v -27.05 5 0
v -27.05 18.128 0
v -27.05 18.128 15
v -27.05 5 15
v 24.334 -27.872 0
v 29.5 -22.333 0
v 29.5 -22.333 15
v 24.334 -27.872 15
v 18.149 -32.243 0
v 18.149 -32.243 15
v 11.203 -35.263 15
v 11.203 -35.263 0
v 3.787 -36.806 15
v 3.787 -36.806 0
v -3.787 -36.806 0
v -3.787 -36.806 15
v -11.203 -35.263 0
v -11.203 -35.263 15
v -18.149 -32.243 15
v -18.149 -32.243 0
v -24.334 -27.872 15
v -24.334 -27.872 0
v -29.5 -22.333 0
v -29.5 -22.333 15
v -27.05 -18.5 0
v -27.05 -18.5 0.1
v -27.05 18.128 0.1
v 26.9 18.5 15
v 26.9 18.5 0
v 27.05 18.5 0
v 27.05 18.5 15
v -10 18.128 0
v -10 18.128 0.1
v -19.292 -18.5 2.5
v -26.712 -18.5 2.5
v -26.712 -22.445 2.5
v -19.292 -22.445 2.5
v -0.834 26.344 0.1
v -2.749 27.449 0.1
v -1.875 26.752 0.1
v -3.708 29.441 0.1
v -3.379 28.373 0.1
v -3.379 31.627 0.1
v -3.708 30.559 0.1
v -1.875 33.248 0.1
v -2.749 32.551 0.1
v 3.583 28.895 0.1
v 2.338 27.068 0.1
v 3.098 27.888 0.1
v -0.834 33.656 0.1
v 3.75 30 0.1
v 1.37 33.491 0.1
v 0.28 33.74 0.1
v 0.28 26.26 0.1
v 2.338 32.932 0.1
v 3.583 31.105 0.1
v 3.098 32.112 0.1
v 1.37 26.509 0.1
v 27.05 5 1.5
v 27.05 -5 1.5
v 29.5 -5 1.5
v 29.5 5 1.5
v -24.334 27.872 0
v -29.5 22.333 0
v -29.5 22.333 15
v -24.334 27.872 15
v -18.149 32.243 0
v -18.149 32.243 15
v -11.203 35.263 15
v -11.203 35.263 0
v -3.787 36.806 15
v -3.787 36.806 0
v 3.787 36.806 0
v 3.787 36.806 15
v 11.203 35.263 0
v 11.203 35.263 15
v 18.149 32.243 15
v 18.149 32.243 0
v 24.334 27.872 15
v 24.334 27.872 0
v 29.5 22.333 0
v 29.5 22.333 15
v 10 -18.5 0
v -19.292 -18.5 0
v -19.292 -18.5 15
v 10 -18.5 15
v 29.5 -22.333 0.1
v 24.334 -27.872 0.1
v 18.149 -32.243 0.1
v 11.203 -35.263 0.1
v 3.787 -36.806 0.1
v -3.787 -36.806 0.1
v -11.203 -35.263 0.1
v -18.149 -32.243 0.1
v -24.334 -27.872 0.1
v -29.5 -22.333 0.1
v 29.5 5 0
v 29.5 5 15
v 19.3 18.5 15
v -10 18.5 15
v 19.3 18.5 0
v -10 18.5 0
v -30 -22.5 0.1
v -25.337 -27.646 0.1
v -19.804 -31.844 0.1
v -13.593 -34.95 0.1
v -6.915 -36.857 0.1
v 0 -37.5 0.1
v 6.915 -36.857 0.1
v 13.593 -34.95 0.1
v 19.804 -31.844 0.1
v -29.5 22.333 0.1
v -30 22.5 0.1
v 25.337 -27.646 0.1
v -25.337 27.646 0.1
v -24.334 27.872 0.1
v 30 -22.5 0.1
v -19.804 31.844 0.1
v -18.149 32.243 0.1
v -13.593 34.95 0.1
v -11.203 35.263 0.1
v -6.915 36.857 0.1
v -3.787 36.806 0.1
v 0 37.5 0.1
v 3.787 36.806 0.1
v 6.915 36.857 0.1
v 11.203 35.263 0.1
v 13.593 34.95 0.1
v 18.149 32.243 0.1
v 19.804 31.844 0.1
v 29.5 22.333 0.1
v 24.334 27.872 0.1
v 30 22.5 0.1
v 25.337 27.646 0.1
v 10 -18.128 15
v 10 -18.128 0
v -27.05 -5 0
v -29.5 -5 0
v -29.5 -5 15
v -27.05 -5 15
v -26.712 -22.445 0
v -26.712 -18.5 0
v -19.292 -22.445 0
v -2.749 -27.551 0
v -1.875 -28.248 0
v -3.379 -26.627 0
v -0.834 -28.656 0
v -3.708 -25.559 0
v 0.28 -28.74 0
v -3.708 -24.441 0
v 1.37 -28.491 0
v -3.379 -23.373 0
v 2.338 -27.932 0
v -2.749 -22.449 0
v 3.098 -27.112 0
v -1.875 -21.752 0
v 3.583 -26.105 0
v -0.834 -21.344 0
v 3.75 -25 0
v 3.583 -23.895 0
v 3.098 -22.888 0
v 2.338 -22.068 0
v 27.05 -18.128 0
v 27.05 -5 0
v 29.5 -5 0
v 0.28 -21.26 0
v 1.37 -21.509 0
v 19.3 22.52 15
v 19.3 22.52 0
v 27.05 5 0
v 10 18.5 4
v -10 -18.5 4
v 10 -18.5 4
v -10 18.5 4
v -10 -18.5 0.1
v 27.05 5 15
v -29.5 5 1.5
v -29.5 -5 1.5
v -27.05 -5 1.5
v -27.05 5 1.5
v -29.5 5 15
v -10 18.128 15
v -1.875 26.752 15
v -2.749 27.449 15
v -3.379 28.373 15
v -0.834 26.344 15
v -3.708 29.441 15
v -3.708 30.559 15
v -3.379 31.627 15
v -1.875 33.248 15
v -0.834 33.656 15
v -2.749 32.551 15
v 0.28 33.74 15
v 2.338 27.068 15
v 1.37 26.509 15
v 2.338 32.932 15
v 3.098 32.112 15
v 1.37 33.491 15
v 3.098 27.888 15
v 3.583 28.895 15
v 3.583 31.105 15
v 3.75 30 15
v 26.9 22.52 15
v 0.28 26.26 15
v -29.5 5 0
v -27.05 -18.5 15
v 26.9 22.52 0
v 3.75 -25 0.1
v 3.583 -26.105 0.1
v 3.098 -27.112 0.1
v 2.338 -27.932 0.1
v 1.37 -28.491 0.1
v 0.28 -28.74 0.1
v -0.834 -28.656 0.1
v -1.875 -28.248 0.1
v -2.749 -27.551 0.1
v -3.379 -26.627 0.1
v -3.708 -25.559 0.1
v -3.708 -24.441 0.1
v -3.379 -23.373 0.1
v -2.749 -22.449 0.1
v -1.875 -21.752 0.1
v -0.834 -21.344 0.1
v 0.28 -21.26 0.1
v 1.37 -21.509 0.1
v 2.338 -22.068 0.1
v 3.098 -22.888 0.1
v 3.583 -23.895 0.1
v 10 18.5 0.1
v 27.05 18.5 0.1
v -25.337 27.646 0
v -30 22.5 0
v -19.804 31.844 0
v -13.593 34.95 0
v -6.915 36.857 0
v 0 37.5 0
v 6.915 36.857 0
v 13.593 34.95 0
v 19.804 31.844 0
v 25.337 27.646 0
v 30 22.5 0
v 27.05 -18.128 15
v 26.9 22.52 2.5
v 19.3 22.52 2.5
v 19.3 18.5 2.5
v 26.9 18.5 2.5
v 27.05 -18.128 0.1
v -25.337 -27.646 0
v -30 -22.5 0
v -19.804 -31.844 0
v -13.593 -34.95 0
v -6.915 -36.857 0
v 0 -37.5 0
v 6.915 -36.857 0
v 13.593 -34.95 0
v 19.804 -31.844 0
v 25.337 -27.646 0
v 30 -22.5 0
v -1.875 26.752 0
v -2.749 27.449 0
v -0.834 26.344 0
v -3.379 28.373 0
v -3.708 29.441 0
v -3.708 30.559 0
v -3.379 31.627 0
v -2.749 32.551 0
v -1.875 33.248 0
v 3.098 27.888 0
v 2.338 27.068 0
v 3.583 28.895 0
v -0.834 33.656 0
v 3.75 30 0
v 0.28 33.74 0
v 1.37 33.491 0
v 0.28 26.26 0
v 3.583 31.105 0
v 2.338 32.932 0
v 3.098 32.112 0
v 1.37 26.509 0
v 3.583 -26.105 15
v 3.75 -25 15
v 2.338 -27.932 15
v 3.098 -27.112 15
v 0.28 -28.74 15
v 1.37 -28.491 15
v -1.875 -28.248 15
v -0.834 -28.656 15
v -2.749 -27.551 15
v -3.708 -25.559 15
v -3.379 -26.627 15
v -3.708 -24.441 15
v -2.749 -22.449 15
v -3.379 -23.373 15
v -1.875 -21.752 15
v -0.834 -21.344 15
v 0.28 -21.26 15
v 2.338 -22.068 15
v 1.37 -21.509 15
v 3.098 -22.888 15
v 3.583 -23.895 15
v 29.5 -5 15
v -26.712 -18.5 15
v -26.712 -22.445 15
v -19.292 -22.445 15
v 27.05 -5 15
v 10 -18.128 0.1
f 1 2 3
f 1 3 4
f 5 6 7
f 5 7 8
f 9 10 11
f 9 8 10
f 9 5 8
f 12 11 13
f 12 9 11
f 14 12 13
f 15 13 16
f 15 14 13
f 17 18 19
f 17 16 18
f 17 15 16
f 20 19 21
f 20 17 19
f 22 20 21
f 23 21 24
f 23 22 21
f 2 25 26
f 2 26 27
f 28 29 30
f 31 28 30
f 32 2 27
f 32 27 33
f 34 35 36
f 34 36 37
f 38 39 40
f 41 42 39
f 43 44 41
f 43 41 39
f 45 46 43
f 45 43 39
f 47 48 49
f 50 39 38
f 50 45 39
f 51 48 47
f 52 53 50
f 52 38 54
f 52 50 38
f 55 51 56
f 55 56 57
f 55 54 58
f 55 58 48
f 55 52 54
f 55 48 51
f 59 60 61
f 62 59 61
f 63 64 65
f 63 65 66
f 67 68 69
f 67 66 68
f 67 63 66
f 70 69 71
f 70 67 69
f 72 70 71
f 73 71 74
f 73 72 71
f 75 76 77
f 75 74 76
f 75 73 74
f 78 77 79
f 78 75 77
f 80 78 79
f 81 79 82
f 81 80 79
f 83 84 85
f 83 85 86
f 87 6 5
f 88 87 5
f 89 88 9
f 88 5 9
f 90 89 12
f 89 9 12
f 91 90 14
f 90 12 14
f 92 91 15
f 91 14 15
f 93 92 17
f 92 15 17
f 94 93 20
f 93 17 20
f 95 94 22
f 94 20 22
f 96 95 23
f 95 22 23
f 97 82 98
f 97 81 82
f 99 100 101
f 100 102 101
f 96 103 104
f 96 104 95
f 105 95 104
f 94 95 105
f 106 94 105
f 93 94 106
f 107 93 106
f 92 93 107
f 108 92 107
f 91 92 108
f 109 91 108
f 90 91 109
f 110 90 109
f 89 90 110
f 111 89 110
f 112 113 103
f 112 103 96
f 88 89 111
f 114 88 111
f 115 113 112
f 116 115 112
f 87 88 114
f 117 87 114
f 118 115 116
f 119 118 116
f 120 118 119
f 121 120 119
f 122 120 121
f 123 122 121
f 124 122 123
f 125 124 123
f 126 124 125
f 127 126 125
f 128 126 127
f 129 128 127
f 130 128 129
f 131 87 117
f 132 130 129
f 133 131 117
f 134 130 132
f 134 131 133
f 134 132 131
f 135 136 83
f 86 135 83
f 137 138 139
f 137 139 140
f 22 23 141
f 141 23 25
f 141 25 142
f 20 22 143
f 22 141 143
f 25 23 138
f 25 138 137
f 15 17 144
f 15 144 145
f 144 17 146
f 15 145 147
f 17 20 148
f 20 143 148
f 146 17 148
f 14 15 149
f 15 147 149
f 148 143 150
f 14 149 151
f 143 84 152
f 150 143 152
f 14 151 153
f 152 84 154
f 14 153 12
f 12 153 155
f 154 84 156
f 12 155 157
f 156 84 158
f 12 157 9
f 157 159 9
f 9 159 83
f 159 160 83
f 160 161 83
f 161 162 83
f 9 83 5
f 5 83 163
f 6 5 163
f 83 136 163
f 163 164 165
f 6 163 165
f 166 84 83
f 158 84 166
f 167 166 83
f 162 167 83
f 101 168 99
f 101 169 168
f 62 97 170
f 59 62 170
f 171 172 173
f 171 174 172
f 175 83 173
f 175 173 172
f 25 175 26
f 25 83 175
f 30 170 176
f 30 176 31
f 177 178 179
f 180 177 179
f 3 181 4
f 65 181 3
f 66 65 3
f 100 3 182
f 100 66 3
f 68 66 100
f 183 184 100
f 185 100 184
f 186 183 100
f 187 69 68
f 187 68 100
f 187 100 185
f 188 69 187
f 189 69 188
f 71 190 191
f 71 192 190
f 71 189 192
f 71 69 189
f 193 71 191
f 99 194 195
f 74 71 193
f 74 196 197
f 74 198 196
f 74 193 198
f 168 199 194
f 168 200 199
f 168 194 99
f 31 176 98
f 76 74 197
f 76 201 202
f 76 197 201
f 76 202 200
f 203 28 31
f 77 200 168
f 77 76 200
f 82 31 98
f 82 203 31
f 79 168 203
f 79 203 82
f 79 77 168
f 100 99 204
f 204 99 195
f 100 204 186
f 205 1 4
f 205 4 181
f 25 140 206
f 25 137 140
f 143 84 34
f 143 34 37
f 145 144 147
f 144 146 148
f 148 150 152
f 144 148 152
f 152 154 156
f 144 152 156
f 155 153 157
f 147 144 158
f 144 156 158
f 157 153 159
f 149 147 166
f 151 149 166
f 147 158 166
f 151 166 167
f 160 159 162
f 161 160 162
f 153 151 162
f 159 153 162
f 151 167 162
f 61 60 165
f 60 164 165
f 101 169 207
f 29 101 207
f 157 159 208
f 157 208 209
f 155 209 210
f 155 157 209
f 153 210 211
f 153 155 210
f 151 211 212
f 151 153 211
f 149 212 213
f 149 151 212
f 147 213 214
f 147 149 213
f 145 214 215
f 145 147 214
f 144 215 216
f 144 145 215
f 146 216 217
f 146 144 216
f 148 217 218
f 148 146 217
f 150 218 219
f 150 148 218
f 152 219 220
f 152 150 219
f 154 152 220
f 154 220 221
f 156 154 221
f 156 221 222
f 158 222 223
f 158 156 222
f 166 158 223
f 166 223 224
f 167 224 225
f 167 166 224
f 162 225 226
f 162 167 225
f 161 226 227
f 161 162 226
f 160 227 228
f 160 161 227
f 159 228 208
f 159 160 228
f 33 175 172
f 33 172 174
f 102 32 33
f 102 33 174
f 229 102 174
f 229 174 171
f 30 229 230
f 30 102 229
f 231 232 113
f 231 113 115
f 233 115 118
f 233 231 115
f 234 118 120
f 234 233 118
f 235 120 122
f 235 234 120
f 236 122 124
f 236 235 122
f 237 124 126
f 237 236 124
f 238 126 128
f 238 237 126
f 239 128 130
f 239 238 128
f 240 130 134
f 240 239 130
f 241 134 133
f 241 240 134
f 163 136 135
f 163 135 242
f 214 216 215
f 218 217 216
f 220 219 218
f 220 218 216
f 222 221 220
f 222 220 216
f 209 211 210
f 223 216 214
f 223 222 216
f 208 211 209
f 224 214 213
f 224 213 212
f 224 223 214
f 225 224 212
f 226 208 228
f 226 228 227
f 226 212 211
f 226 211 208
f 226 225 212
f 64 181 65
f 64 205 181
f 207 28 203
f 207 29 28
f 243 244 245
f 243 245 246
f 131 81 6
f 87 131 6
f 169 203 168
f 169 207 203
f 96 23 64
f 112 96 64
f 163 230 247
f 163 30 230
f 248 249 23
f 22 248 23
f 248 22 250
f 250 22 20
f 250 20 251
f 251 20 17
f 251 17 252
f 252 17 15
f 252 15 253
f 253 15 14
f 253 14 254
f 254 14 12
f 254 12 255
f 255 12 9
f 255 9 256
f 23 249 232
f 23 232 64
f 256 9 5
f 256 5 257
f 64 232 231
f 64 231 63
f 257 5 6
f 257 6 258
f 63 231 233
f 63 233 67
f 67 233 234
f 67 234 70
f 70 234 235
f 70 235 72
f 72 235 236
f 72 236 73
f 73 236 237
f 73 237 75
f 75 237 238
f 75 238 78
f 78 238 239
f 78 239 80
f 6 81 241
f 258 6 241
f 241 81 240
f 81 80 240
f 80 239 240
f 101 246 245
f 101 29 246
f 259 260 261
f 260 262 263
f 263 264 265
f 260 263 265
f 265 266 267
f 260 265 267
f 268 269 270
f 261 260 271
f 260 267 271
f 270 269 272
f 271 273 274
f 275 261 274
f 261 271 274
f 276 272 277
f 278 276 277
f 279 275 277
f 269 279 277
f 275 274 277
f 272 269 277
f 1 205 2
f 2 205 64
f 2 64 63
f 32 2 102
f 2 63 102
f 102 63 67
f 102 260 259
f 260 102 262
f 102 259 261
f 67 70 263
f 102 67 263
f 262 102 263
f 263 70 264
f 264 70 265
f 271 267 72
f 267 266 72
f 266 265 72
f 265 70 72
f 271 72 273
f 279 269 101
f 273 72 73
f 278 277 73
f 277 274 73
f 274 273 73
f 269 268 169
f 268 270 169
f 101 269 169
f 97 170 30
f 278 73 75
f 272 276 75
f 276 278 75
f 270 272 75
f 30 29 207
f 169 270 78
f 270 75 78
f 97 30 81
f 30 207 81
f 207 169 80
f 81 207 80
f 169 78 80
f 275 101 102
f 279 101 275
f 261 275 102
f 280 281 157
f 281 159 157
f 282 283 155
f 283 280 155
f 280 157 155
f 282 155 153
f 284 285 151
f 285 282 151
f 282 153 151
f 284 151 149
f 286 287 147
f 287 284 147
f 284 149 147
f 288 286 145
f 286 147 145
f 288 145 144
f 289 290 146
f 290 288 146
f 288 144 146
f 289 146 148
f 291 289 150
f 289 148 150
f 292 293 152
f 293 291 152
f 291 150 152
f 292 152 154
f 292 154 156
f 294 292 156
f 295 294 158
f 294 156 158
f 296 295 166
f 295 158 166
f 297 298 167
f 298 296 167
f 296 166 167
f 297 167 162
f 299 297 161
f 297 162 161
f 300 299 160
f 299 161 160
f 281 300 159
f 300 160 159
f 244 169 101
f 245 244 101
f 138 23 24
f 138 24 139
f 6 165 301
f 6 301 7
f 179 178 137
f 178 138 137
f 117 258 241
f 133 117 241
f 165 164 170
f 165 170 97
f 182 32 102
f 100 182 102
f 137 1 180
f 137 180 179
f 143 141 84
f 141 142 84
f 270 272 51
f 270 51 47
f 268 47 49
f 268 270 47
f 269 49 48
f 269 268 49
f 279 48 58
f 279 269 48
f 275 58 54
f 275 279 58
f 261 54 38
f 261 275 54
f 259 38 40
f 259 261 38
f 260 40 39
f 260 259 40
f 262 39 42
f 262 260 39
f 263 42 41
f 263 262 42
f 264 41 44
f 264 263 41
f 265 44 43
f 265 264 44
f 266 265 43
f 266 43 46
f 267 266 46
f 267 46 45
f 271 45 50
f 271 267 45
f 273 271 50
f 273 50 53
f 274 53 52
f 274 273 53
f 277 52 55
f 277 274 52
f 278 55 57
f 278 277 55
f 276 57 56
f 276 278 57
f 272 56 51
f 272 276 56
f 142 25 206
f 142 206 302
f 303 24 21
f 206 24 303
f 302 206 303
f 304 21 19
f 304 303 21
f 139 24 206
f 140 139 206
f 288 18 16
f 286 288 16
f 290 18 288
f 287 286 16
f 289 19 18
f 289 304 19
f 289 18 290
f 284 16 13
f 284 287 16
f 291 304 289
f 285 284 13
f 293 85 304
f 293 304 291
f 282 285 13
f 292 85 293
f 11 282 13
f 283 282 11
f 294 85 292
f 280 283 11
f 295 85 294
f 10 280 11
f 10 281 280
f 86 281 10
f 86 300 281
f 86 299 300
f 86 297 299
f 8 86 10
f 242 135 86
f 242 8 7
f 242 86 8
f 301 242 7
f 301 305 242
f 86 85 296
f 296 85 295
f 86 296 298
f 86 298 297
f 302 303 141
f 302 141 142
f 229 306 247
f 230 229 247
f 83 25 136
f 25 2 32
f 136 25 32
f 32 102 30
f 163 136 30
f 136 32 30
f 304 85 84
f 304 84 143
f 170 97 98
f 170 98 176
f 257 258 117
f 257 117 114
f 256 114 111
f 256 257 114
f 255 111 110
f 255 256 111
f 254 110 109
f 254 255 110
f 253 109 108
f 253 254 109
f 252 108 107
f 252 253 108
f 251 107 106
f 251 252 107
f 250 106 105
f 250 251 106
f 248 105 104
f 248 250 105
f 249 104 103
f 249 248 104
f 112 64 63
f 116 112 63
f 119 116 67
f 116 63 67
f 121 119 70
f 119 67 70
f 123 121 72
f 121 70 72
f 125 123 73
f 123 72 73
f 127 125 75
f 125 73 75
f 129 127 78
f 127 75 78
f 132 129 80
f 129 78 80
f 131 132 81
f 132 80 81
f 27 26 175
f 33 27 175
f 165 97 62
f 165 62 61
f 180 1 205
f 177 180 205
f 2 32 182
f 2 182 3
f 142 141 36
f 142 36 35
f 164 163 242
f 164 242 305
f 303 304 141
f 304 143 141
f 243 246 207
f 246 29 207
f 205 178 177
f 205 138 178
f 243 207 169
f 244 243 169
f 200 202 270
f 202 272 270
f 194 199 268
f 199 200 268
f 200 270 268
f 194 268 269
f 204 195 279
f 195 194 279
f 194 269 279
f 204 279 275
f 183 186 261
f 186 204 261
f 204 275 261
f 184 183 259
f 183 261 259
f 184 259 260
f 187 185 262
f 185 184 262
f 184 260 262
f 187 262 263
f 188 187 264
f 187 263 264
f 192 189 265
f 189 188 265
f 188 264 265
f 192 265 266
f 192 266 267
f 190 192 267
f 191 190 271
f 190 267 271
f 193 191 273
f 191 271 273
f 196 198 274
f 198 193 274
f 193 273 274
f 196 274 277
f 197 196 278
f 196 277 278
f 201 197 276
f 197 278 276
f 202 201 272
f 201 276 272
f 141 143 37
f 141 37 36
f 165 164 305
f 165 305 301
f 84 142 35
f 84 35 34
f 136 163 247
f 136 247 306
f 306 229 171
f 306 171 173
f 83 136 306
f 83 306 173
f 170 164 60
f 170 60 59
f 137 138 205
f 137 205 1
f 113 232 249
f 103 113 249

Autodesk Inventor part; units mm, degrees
ref_plane "YZ Plane" through (0, 0, 0) normal (1, 0, 0) x (0, 1, 0)
ref_plane "XZ Plane" through (0, 0, 0) normal (0, 1, 0) x (-1, 0, 0)
ref_plane "XY Plane" through (0, 0, 0) normal (0, 0, 1) x (1, 0, 0)
ref_plane "Work Plane1" through (0, 40.5, -6.5875) normal (0, 1, 0) x (1, 0, 0)
ref_plane "Work Plane2" through (0, 0, 0) normal (0, 0, 1) x (1, 0, 0)
sketch "KEEPOUT_BOT_0.1MM_S" plane through (0, 0, 0) normal (0, 0, 1) x (1, 0, 0)
  circle A0 centre (0, -25) radius 1.75 projected
  circle A1 centre (-14, -14) radius 1.75 projected
  circle A2 centre (22, -14) radius 1.75 projected
  circle A3 centre (14, 14) radius 1.75 projected
  circle A4 centre (-22, 14) radius 1.75 projected
  circle A5 centre (0, 30) radius 1.75 projected
  line L0 (-30, 22.5) -> (-30, -22.5) projected
  arc A6 (-30, -22.5) -> (30, -22.5) centre (0, 0) ccw projected
  line L1 (30, -22.5) -> (30, 22.5) projected
  arc A7 (30, 22.5) -> (-30, 22.5) centre (0, 0) ccw projected
  circle A8 centre (0, -25) radius 3.75 projected
  circle A9 centre (0, 30) radius 3.75 projected
  circle A10 centre (-22, 14) radius 1.75 projected
  circle A11 centre (-14, -14) radius 1.75 projected
  line L2 (-18.5, 11.6278) -> (-26.55, 11.6278) projected
  arc A12 (-16.5, 9.6278) -> (-18.5, 11.6278) centre (-18.5, 9.6278) ccw projected
  line L3 (-16.5, -17) -> (-16.5, 9.6278) projected
  arc A13 (-16.7679, -18) -> (-16.5, -17) centre (-18.5, -17) ccw projected
  line L4 (-16.7679, -18) -> (-12.5, -18) projected
  arc A14 (-12.5, -18) -> (-10.5, -16) centre (-12.5, -16) ccw projected
  line L5 (-10.5, 15.6278) -> (-10.5, -16) projected
  arc A15 (-10.5, 15.6278) -> (-12.5, 17.6278) centre (-12.5, 15.6278) ccw projected
  line L6 (-24.55, 17.6278) -> (-12.5, 17.6278) projected
  arc A16 (-24.55, 17.6278) -> (-26.55, 15.6278) centre (-24.55, 15.6278) ccw projected
  line L7 (-26.55, 11.6278) -> (-26.55, 15.6278) projected
  circle A17 centre (22, -14) radius 1.75 projected
  circle A18 centre (14, 14) radius 1.75 projected
  line L8 (18.5, -11.6278) -> (26.55, -11.6278) projected
  arc A19 (16.5, -9.6278) -> (18.5, -11.6278) centre (18.5, -9.6278) ccw projected
  line L9 (16.5, 17) -> (16.5, -9.6278) projected
  arc A20 (16.7679, 18) -> (16.5, 17) centre (18.5, 17) ccw projected
  line L10 (16.7679, 18) -> (12.5, 18) projected
  arc A21 (12.5, 18) -> (10.5, 16) centre (12.5, 16) ccw projected
  line L11 (10.5, -15.6278) -> (10.5, 16) projected
  arc A22 (10.5, -15.6278) -> (12.5, -17.6278) centre (12.5, -15.6278) ccw projected
  line L12 (24.55, -17.6278) -> (12.5, -17.6278) projected
  arc A23 (24.55, -17.6278) -> (26.55, -15.6278) centre (24.55, -15.6278) ccw projected
  line L13 (26.55, -11.6278) -> (26.55, -15.6278) projected
  line L14 (23.1, 22.02) -> (24.3, 22.02) projected
  line L15 (26.55, -15.6278) -> (26.55, 4.9922) projected
  line L16 (-23.1, -22.02) -> (-24.3, -22.02) projected
  line L17 (-26.55, -11.0422) -> (-26.55, -17) projected
  line L18 (26.7562, -18.1278) -> (10, -18.1278)
  line L19 (10, -18.1278) -> (10, 18.5)
  line L20 (10, 18.5) -> (27.05, 18.5)
  line L21 (27.05, 18.5) -> (27.05, -18.1278)
  line L22 (27.05, -18.1278) -> (26.7562, -18.1278)
  line L23 (-10, -18.5) -> (-27.05, -18.5)
  line L24 (-27.05, -18.5) -> (-27.05, 18.1278)
  line L25 (-27.05, 18.1278) -> (-10, 18.1278)
  line L26 (-10, 18.1278) -> (-10, -18.5)
  arc A24 (-29.5, -22.3327) -> (29.5, -22.3327) centre (0, 0) ccw
  line L27 (-29.5, -22.3327) -> (-29.5, 22.3327)
  arc A25 (29.5, 22.3327) -> (-29.5, 22.3327) centre (0, 0) ccw
  line L28 (29.5, 22.3327) -> (29.5, -22.3327)
  point P0 (0, 0)
  dimension "d0" = 0.5
  dimension "d1" = 0.5
  dimension "d2" = 0.5
  dimension "d3" = 0.5
  dimension "d4" = 0.5
  dimension "d5" = 0.5
  dimension "d6" = 0.5
  dimension "d7" = 0.5
  dimension "d12" = 0.5
extrude "KEEPUT_BOT_0.1MM" add sketch "KEEPOUT_BOT_0.1MM_S" along normal blind 0.1 contours A0 | A1 | A2 | A3 | A4 | A5 | A7 L1 A6 L0 | A8 | A9 | L2 L7 A16 L6 A15 L5 A14 L4 A13 L3 A12 | L8 L13 A23 L12 A22 L11 A21 L10 A20 L9 A19 | L18 L19 L20 L21 L22 | L23 L24 L25 L26
ref_plane "Work Plane3" through (0, 0, 0) normal (0, 0, 1) x (1, 0, 0)
sketch "KEEPOUT_BOT_1.5MM_S" plane through (0, 0, 0) normal (0, 0, 1) x (1, 0, 0)
  line L0 (10, -18.1278) -> (27.05, -18.1278)
  line L1 (27.05, -18.1278) -> (27.05, 18.5)
  line L2 (27.05, 18.5) -> (10, 18.5)
  line L3 (10, 18.5) -> (10, -18.1278)
  line L4 (21.9, 22.02) -> (23.1, 22.02)
  line L5 (19.8, 18.35) -> (19.8, 20.35)
  line L6 (27.05, 18.5) -> (19.3, 18.5)
  line L7 (19.3, 18.5) -> (19.3, 22.52)
  line L8 (19.3, 22.52) -> (27.05, 22.52)
  line L9 (27.05, 22.52) -> (27.05, 18.5)
  line L10 (27.4, -5) -> (30.4, -5)
  line L11 (27.4, 5) -> (30.4, 5)
  line L12 (-29.5, -22.3327) -> (-29.5, 22.3327)
  arc A0 (29.5, 22.3327) -> (-29.5, 22.3327) centre (0, 0) ccw
  line L13 (29.5, 22.3327) -> (29.5, -22.3327)
  arc A1 (-29.5, -22.3327) -> (29.5, -22.3327) centre (0, 0) ccw
  line L14 (-30, 22.5) -> (-30, -22.5)
  arc A2 (-30, -22.5) -> (30, -22.5) centre (0, 0) ccw
  line L15 (30, -22.5) -> (30, 22.5)
  arc A3 (30, 22.5) -> (-30, 22.5) centre (0, 0) ccw
  line L16 (29.5, 22.3327) -> (29.5, -22.3327)
  line L17 (27.05, 18.5) -> (27.05, -18.1278)
  line L18 (29.5, 5) -> (27.05, 5)
  line L19 (27.05, 5) -> (27.05, -5)
  line L20 (27.05, -5) -> (29.5, -5)
  line L21 (29.5, -5) -> (29.5, 5)
  line L22 (-27.05, -18.5) -> (-10, -18.5)
  line L23 (-10, -18.5) -> (-10, 18.1278)
  line L24 (-10, 18.1278) -> (-27.05, 18.1278)
  line L25 (-27.05, 18.1278) -> (-27.05, -18.5)
  line L26 (-27.4, 5) -> (-30.4, 5)
  line L27 (-27.4, -5) -> (-30.4, -5)
  line L28 (-29.5, 22.3327) -> (-29.5, -22.3327)
  line L29 (-29.5, -5) -> (-27.05, -5)
  line L30 (-27.05, -5) -> (-27.05, 5)
  line L31 (-27.05, 5) -> (-29.5, 5)
  line L32 (-29.5, 5) -> (-29.5, -5)
  line L33 (-23.1, -22.02) -> (-24.3, -22.02)
  line L34 (-19.8, -10.37) -> (-19.8, -19.37)
  line L35 (-10, -18.5) -> (-27.05, -18.5)
  line L36 (-27.05, -18.5) -> (-19.8, -18.5)
  line L37 (-19.8, -18.5) -> (-19.8, -22.02)
  line L38 (-19.8, -22.02) -> (-27.05, -22.02)
  line L39 (-27.05, -22.02) -> (-27.05, -18.5)
  point P0 (0, 0)
extrude "KEEPOUT_BOT_1.5MM" add sketch "KEEPOUT_BOT_1.5MM_S" along normal blind 1.5 separate body contours L1 L18 L11 L13 L10 L20 | L12 L26 L31 L25 L29 L27
ref_plane "Work Plane4" through (0, 0, 0) normal (0, 0, 1) x (1, 0, 0)
sketch "KEEPOUT_BOT_2.5MM_S" plane through (0, 0, 0) normal (0, 0, 1) x (1, 0, 0)
  line L0 (23.1, 22.02) -> (24.3, 22.02) projected
  line L1 (19.8, 10.37) -> (19.8, 19.37) projected
  line L2 (26.4, 10.37) -> (26.4, 19.37) projected
  line L3 (27.05, 18.5) -> (10, 18.5) projected
  line L4 (19.3, 18.5) -> (26.9, 18.5)
  line L5 (26.9, 18.5) -> (26.9, 22.52)
  line L6 (26.9, 22.52) -> (19.3, 22.52)
  line L7 (19.3, 22.52) -> (19.3, 18.5)
  line L8 (-23.1, -22.02) -> (-24.3, -22.02) projected
  line L9 (-19.8, -20.35) -> (-19.8, -10.37) projected
  line L10 (-26.4, -10.37) -> (-26.4, -19.37) projected
  line L11 (-27.05, -18.5) -> (-10, -18.5) projected
  line L12 (-26.7119, -18.5) -> (-19.2922, -18.5)
  line L13 (-19.2922, -18.5) -> (-19.2922, -22.4447)
  line L14 (-19.2922, -22.4447) -> (-26.7119, -22.4447)
  line L15 (-26.7119, -22.4447) -> (-26.7119, -18.5)
  point P0 (0, 0)
  dimension "d15" = 0.5
  dimension "d16" = 0.5
  dimension "d17" = 0.5
extrude "KEEPOUT_BOT_2.5MM" add sketch "KEEPOUT_BOT_2.5MM_S" along normal blind 2.5 separate body
ref_plane "Work Plane5" through (0, 0, 0) normal (0, 0, 1) x (1, 0, 0)
sketch "KEEPOUT_BOT_4MM_s" plane through (0, 0, 0) normal (0, 0, 1) x (1, 0, 0)
  circle A0 centre (22, -14) radius 1.75 projected
  circle A1 centre (14, 14) radius 1.75 projected
  line L0 (18.5, -11.6278) -> (26.55, -11.6278) projected
  arc A2 (16.5, -9.6278) -> (18.5, -11.6278) centre (18.5, -9.6278) ccw projected
  line L1 (16.5, 17) -> (16.5, -9.6278) projected
  arc A3 (16.7679, 18) -> (16.5, 17) centre (18.5, 17) ccw projected
  line L2 (16.7679, 18) -> (12.5, 18) projected
  arc A4 (12.5, 18) -> (10.5, 16) centre (12.5, 16) ccw projected
  line L3 (10.5, -15.6278) -> (10.5, 16) projected
  arc A5 (10.5, -15.6278) -> (12.5, -17.6278) centre (12.5, -15.6278) ccw projected
  line L4 (24.55, -17.6278) -> (12.5, -17.6278) projected
  arc A6 (24.55, -17.6278) -> (26.55, -15.6278) centre (24.55, -15.6278) ccw projected
  line L5 (26.55, -11.6278) -> (26.55, -15.6278) projected
  circle A7 centre (-22, 14) radius 1.75 projected
  circle A8 centre (-14, -14) radius 1.75 projected
  line L6 (-18.5, 11.6278) -> (-26.55, 11.6278) projected
  arc A9 (-16.5, 9.6278) -> (-18.5, 11.6278) centre (-18.5, 9.6278) ccw projected
  line L7 (-16.5, -17) -> (-16.5, 9.6278) projected
  arc A10 (-16.7679, -18) -> (-16.5, -17) centre (-18.5, -17) ccw projected
  line L8 (-16.7679, -18) -> (-12.5, -18) projected
  arc A11 (-12.5, -18) -> (-10.5, -16) centre (-12.5, -16) ccw projected
  line L9 (-10.5, 15.6278) -> (-10.5, -16) projected
  arc A12 (-10.5, 15.6278) -> (-12.5, 17.6278) centre (-12.5, 15.6278) ccw projected
  line L10 (-24.55, 17.6278) -> (-12.5, 17.6278) projected
  arc A13 (-24.55, 17.6278) -> (-26.55, 15.6278) centre (-24.55, 15.6278) ccw projected
  line L11 (-26.55, 11.6278) -> (-26.55, 15.6278) projected
  line L12 (10, -18.5) -> (-10, -18.5)
  line L13 (-10, -18.5) -> (-10, 18.5)
  line L14 (-10, 18.5) -> (10, 18.5)
  line L15 (10, 18.5) -> (10, -18.5)
  point P0 (0, 0)
extrude "KEEPOUT_BOT_4MM" add sketch "KEEPOUT_BOT_4MM_s" along normal blind 4 contours L12 L13 L14 L15 bodies 1
ref_plane "Work Plane6" through (0, 0, 0) normal (0, 0, 1) x (1, 0, 0)
sketch "KEEPOUT_BOT_15MM_S" plane through (0, 0, 0) normal (0, 0, 1) x (1, 0, 0)
  arc A0 (-29.5, -22.3327) -> (29.5, -22.3327) centre (0, 0) ccw projected
  line L0 (29.5, 22.3327) -> (29.5, -22.3327) projected
  line L1 (27.05, -5) -> (29.5, -5) projected
  line L2 (27.05, -18.1278) -> (27.05, 18.5) projected
  line L3 (10, -18.1278) -> (27.05, -18.1278) projected
  line L4 (-10, -18.5) -> (10, -18.5) projected
  line L5 (-27.05, -18.5) -> (-10, -18.5) projected
  line L6 (-19.2922, -18.5) -> (-19.2922, -22.4447) projected
  line L7 (-19.2922, -22.4447) -> (-26.7119, -22.4447) projected
  line L8 (-26.7119, -22.4447) -> (-26.7119, -18.5) projected
  line L9 (-27.05, 18.1278) -> (-27.05, -18.5) projected
  line L10 (-29.5, -5) -> (-27.05, -5) projected
  line L11 (-29.5, -22.3327) -> (-29.5, 22.3327) projected
  line L12 (-27.05, 5) -> (-29.5, 5) projected
  line L13 (-10, 18.1278) -> (-27.05, 18.1278) projected
  line L14 (-10, 18.1278) -> (-10, 18.5) projected
  line L15 (-10, 18.5) -> (27.05, 18.5) projected
  arc A1 (29.5, 22.3327) -> (-29.5, 22.3327) centre (0, 0) ccw projected
  circle A2 centre (0, -25) radius 3.75 projected
  circle A3 centre (0, 30) radius 3.75 projected
  line L16 (29.5, 5) -> (27.05, 5) projected
  line L17 (19.3, 18.5) -> (26.9, 18.5) projected
  line L18 (26.9, 18.5) -> (26.9, 22.52) projected
  line L19 (26.9, 22.52) -> (19.3, 22.52) projected
  line L20 (19.3, 22.52) -> (19.3, 18.5) projected
  line L21 (10, -18.1278) -> (10, -18.5) projected
  line L22 (-24.93, -13.25) -> (-24.93, -1.6425) projected
  line L23 (-29.5, 22.3327) -> (-29.5, -22.3327) projected
  point P0 (0, 0)
extrude "KEEPOUT_BOT_15MM" add sketch "KEEPOUT_BOT_15MM_S" along normal blind 15 separate body contours L11 L10 L9 L5 L8 L7 L6 L4 L21 L3 L2 L1 L0 A0 | L11 A1 L0 L16 L2 L15 L18 L19 L20 L14 L13 L9 L12
equation "\"d1\" = d0"
equation "\"d2\" = d1"
equation "\"d3\" = d0"
equation "\"d4\" = d1"
equation "\"d5\" = d1"
equation "\"d6\" = d3"
equation "\"d7\" = d3"
equation "\"d16\" = d15"
equation "\"d17\" = d15"
equation "\"d11\" = d10"
equation "\"d10\" = 0.5"
properties part number "KEEPOUT_BOTTOM"
